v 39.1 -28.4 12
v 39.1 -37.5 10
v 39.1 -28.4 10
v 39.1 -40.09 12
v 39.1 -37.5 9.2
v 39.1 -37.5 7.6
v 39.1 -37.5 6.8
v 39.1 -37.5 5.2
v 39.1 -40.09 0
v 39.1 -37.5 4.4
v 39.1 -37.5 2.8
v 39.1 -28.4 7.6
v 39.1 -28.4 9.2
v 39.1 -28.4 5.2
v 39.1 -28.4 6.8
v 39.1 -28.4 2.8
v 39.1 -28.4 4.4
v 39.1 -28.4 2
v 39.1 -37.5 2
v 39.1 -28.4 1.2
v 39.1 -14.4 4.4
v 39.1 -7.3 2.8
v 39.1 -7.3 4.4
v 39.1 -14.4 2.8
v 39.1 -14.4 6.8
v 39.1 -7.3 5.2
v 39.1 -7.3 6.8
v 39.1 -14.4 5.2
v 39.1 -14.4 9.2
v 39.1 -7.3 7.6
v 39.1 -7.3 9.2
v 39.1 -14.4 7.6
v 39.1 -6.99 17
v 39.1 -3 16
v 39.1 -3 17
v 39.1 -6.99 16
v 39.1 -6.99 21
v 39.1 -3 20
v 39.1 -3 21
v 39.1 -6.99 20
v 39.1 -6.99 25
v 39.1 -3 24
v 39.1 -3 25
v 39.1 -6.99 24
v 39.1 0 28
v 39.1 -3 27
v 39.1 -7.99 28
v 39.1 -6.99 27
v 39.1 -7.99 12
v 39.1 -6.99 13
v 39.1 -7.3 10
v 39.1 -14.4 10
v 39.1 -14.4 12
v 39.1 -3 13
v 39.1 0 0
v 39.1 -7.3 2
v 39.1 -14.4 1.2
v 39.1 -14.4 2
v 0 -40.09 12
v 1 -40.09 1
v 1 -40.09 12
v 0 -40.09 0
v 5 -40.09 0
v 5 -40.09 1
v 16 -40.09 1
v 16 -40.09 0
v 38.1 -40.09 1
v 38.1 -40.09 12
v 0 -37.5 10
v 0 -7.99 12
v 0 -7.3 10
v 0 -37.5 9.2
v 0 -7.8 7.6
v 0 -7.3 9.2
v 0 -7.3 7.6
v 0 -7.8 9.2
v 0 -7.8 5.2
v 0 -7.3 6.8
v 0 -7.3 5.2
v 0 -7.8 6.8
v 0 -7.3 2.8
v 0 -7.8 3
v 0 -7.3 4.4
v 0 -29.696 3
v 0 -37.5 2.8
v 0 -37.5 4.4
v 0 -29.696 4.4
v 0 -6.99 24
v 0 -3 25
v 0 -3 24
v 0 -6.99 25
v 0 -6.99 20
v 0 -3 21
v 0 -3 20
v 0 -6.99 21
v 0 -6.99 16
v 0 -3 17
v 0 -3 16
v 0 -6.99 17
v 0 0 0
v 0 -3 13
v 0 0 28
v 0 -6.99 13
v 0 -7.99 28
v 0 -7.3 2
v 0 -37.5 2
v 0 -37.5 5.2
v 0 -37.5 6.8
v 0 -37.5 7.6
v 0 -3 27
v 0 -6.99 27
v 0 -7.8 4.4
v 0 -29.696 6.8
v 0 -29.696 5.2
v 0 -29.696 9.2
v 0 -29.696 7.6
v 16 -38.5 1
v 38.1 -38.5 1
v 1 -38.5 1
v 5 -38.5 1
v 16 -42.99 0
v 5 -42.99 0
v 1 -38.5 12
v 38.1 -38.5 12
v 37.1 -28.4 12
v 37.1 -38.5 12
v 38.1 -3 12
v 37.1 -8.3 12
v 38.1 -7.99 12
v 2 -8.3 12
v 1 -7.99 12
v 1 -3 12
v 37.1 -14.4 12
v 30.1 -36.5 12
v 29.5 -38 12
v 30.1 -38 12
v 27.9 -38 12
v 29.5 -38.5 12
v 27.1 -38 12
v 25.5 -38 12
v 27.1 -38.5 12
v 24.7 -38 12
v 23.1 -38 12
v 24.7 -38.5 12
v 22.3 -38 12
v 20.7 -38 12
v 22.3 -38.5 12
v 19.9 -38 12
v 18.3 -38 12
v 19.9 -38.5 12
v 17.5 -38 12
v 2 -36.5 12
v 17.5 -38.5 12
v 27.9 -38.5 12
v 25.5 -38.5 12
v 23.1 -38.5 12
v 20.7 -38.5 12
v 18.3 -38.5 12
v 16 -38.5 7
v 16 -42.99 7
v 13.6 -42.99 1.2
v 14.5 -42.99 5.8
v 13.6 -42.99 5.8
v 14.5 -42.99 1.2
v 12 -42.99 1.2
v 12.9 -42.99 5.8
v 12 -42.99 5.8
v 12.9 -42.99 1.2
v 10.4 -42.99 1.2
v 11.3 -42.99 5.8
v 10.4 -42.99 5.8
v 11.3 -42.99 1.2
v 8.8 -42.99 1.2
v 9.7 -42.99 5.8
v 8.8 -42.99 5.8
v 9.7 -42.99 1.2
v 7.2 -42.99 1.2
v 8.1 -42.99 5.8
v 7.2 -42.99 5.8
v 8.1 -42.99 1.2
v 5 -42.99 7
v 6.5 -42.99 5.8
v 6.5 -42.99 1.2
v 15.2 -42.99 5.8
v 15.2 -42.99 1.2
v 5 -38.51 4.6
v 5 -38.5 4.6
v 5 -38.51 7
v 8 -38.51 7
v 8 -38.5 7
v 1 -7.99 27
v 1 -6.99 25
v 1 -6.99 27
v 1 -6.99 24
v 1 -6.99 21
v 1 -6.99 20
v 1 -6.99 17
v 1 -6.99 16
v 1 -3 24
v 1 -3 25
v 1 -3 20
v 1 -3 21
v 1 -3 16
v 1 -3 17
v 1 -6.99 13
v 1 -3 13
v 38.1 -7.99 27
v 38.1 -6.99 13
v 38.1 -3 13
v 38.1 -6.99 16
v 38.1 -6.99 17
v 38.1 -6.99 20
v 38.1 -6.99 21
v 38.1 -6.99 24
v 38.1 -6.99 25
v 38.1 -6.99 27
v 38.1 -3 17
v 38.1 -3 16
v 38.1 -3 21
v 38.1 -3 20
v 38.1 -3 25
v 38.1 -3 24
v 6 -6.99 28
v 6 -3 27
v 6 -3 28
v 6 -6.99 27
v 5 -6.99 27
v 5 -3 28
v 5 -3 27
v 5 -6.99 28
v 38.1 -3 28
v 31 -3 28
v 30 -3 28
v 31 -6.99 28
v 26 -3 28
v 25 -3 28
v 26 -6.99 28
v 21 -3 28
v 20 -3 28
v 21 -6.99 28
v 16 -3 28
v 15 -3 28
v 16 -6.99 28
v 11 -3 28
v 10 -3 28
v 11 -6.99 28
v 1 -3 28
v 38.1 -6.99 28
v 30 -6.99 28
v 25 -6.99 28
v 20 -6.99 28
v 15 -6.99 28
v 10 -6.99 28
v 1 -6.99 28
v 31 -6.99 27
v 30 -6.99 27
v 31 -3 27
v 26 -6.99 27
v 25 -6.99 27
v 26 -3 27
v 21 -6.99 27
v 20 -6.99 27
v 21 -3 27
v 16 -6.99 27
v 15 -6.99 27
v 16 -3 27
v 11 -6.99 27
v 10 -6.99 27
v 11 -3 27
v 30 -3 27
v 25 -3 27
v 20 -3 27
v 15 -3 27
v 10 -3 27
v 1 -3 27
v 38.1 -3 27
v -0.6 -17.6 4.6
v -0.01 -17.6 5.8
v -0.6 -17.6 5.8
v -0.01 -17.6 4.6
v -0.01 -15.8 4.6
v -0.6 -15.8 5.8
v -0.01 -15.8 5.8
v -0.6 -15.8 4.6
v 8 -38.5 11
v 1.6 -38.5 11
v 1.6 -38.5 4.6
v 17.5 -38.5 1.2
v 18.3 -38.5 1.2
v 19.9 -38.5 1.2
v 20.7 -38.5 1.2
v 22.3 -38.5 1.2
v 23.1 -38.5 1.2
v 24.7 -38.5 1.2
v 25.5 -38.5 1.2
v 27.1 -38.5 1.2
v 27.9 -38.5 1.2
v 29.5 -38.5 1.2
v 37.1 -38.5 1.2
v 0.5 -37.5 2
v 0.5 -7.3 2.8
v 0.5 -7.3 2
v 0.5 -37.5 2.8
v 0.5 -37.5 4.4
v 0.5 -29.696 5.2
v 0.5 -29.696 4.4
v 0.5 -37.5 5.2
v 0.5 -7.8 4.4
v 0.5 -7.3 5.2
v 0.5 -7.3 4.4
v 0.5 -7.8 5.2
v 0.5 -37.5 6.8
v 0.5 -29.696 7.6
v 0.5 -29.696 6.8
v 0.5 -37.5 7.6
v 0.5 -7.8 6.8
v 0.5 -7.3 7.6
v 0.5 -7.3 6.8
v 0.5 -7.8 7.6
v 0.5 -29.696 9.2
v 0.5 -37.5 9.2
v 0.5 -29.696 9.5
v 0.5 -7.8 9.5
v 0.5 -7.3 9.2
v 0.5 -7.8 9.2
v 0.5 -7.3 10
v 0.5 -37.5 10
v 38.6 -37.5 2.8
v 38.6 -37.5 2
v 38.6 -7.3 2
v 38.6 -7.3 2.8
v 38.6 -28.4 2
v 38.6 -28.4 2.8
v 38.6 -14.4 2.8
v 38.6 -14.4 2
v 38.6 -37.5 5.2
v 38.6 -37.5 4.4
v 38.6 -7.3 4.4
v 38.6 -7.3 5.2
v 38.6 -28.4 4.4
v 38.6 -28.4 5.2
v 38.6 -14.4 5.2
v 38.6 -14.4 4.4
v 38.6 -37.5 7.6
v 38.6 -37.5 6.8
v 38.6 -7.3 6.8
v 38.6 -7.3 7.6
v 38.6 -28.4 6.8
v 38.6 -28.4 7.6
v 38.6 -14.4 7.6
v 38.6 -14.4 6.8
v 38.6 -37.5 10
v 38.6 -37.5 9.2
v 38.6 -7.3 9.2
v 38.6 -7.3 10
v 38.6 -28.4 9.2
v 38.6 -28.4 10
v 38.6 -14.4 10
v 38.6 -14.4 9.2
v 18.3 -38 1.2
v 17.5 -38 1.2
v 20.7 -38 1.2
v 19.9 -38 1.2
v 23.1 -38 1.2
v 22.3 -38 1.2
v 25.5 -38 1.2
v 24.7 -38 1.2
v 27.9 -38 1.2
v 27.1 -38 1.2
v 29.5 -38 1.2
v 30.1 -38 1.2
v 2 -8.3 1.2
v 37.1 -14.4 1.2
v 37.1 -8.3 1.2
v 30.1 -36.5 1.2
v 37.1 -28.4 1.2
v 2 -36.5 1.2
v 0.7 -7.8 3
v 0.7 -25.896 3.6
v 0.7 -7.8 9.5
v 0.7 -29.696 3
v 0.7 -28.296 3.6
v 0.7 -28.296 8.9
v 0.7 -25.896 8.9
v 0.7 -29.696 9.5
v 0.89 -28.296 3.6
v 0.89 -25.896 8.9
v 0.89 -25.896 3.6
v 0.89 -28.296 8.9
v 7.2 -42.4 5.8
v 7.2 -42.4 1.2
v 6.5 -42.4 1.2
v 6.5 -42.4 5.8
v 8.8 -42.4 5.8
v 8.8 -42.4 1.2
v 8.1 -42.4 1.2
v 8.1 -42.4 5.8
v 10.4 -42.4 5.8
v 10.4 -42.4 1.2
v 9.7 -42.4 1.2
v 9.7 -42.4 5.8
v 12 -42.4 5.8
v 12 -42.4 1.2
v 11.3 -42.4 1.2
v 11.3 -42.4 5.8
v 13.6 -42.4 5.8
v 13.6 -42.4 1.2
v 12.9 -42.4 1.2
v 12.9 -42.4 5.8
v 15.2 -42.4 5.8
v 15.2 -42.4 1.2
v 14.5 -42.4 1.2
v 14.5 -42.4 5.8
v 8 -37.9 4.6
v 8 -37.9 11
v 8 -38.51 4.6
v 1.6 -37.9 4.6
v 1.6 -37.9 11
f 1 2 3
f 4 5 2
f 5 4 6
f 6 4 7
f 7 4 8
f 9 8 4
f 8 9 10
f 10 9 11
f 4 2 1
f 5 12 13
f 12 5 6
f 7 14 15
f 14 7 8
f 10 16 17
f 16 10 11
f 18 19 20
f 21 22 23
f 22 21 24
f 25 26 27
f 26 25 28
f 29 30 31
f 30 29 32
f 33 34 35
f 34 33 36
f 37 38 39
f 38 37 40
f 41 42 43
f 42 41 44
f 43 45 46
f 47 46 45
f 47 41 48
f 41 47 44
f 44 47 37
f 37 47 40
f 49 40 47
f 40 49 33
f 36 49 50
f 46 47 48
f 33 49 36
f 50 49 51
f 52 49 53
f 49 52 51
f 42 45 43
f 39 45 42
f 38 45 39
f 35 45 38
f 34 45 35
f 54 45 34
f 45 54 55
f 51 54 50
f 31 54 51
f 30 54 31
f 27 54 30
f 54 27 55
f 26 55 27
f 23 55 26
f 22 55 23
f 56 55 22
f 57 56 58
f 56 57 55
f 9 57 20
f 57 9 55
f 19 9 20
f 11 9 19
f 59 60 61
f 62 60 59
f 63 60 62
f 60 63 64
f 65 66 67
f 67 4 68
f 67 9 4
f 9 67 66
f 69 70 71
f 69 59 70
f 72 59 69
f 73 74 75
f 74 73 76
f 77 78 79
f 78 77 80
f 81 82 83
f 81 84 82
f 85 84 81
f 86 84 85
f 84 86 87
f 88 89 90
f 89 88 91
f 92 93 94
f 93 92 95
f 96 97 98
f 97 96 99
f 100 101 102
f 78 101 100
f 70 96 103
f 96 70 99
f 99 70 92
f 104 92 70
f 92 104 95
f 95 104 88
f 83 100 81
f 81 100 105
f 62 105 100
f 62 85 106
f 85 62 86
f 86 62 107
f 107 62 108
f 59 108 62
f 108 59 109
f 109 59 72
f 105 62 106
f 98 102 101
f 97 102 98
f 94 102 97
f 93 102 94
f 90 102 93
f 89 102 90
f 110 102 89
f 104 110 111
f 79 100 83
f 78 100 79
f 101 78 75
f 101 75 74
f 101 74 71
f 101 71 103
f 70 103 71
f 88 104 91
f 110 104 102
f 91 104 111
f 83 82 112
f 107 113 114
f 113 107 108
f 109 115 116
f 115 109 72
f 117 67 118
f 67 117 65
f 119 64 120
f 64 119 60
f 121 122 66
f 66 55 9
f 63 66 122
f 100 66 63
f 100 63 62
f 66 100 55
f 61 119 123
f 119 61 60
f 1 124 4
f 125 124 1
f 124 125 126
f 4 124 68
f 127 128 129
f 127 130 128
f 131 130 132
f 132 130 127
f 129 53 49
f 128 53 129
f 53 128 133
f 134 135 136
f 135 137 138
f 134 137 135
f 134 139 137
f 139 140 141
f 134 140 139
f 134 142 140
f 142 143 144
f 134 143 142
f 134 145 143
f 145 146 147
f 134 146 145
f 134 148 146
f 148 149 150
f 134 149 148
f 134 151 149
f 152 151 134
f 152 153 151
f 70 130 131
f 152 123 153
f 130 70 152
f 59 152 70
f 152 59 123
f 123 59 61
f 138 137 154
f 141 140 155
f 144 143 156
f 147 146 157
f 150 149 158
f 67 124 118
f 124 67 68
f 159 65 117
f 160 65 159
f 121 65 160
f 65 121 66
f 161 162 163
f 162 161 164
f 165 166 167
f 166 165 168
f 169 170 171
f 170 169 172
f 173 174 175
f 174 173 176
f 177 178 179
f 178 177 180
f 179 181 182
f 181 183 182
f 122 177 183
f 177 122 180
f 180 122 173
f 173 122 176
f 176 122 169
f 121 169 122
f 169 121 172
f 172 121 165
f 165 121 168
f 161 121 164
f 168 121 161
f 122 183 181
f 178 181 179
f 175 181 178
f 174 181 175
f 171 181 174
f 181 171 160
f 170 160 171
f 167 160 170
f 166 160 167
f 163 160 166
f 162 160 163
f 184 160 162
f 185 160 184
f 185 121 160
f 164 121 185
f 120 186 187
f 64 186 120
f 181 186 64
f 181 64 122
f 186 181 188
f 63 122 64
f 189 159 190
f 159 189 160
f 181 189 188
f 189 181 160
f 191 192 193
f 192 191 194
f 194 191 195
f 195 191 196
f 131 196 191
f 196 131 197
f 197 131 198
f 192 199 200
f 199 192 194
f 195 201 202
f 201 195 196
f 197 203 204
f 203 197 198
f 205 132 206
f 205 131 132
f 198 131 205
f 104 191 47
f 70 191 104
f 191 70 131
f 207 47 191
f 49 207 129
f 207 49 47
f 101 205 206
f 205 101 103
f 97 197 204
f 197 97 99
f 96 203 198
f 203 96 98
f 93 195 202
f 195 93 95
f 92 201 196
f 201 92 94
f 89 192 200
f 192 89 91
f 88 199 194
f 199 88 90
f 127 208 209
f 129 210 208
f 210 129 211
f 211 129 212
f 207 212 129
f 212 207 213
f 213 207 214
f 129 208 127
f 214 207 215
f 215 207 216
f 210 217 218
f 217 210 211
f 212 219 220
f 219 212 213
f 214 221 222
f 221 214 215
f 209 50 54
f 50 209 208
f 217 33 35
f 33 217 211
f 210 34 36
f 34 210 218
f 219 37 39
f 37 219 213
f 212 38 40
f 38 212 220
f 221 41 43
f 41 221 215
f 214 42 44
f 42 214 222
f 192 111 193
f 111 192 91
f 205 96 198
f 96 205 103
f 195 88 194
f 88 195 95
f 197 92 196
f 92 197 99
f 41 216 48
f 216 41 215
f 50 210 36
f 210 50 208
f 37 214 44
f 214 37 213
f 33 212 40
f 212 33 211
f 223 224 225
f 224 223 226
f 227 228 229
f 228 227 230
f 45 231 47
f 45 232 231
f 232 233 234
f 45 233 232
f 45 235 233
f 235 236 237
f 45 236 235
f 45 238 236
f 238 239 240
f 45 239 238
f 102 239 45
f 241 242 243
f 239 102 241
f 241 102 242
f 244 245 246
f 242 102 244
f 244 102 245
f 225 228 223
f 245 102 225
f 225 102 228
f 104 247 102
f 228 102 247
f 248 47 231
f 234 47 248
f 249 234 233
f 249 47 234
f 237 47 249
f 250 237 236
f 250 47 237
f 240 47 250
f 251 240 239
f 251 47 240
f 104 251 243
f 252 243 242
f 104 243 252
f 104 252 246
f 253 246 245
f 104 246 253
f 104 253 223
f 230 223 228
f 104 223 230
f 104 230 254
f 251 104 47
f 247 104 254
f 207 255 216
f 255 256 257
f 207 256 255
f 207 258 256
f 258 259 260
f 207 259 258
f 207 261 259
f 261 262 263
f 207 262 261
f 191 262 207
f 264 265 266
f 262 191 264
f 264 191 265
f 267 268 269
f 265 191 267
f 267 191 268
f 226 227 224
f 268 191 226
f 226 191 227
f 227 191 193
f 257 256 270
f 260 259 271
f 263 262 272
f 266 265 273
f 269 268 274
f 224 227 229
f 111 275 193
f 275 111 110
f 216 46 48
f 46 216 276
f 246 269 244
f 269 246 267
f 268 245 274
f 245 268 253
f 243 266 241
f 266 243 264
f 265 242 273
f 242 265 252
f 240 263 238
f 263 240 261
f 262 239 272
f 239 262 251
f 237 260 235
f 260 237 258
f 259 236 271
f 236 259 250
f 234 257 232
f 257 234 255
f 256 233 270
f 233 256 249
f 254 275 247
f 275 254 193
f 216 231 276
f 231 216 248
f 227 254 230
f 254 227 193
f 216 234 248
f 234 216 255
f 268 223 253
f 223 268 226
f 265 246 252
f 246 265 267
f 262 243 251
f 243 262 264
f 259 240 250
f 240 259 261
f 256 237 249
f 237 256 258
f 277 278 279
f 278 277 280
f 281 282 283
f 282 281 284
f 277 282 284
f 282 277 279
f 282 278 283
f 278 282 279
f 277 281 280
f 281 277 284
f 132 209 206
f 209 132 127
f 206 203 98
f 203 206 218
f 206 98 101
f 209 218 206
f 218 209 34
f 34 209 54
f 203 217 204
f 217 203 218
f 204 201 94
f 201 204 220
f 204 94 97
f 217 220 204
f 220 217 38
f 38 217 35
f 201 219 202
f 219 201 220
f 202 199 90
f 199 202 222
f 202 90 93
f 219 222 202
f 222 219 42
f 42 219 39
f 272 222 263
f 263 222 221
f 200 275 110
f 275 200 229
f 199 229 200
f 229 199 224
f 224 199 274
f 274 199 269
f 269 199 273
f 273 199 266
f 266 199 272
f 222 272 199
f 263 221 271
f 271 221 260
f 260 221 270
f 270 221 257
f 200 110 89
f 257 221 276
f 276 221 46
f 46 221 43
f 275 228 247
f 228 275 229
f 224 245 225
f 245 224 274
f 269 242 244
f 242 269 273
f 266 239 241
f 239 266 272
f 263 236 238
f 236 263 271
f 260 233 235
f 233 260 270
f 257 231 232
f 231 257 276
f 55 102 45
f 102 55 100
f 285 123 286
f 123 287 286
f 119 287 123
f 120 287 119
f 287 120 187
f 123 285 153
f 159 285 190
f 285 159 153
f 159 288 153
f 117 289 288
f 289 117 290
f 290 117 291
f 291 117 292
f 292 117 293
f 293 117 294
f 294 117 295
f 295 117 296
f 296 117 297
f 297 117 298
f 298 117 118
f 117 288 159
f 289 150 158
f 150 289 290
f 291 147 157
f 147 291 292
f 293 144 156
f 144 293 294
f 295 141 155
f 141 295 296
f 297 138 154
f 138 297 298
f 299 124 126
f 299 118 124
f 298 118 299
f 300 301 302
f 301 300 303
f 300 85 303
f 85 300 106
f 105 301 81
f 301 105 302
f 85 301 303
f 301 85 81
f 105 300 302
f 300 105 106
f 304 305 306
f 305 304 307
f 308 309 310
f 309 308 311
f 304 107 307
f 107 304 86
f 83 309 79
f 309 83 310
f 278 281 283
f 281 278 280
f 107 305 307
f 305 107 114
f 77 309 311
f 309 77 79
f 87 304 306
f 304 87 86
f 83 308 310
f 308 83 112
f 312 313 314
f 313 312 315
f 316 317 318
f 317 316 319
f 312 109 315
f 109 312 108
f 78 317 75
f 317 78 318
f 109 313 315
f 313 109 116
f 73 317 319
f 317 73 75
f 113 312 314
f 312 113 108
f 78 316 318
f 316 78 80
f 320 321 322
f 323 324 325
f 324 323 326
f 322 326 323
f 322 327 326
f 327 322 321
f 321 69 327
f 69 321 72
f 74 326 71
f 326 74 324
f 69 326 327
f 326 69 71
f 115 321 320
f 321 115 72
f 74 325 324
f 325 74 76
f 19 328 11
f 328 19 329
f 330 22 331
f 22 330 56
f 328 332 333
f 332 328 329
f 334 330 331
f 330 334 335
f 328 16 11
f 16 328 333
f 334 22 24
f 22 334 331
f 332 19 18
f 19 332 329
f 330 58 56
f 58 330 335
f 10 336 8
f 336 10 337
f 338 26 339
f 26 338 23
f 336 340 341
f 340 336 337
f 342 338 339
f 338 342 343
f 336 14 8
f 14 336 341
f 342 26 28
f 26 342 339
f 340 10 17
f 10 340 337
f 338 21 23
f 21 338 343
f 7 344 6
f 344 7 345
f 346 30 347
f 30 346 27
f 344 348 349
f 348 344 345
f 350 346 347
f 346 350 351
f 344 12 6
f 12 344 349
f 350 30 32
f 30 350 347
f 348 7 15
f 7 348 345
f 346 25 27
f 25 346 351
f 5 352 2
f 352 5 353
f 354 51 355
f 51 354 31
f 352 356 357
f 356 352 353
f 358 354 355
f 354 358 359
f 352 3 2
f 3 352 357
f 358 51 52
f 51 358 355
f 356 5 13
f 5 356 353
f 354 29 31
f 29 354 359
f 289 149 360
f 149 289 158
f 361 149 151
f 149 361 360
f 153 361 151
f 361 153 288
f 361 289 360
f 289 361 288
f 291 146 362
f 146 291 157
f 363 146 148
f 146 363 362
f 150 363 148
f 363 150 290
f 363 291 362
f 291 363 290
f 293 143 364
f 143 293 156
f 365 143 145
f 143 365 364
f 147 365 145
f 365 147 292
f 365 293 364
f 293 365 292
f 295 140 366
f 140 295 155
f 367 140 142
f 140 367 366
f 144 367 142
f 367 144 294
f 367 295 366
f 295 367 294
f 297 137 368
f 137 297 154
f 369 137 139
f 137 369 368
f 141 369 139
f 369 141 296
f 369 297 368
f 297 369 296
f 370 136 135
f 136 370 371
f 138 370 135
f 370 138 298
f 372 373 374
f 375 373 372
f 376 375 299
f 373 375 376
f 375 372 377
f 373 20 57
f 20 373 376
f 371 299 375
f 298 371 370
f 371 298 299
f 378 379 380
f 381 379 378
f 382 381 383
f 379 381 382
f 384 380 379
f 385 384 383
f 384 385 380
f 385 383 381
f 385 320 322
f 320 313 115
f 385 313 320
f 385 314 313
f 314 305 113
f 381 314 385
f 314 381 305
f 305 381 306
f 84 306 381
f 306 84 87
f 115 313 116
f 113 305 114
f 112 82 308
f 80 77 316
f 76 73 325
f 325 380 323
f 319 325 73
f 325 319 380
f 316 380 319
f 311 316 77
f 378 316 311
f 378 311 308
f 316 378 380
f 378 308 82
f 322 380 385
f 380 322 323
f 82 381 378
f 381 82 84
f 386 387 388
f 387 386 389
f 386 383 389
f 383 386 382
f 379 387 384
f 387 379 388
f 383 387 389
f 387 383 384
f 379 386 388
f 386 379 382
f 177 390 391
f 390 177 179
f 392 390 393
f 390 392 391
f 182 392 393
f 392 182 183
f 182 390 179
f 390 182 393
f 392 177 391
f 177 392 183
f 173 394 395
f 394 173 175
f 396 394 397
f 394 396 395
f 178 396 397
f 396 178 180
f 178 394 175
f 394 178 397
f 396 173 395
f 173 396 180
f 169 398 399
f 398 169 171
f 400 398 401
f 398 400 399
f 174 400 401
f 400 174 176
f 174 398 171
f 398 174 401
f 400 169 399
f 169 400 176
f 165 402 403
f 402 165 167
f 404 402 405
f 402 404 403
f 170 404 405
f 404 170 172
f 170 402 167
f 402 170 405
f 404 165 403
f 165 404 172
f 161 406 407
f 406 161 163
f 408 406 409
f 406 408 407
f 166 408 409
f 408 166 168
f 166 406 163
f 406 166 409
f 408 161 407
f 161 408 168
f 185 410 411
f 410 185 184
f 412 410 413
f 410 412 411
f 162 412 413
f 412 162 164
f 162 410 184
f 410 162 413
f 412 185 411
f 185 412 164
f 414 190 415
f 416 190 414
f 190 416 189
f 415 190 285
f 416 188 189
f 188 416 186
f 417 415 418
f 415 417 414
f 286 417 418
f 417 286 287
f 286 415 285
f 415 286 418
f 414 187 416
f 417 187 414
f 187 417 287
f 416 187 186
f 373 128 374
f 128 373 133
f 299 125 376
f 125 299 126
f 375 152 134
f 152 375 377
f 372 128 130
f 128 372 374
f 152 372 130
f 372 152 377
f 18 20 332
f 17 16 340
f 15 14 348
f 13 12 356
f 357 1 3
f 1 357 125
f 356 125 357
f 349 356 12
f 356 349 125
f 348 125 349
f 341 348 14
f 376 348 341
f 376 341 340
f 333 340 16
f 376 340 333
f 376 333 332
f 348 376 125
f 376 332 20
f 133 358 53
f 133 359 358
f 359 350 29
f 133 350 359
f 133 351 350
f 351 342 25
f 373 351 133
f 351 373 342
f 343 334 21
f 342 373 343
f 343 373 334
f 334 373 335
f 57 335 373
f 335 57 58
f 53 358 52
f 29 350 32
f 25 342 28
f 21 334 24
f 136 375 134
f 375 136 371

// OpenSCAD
// Presence Monitor - radar station, adhesive-base version (no clip)
// LOLIN S2 Mini + HLK-LD2410C stack in a hut on a flat base that sticks to the monitor top
// with a Command strip or 3M VHB. Dish faceplate glued on the front.
// All dimensions in mm. Edit the values, F6 to render, F7 to export.
//
// Three printed parts, no supports (only short bridges of 5 mm or less):
//   part = "station" : base + riser + hut. Print FRONT FACE DOWN (radar wall on the bed, open
//                      back facing up). Exported already in that position.
//   part = "dish"    : dish faceplate. Print flat back down. 0.12 mm layers look best.
//   part = "tower"   : lattice comms tower. Print standing up as exported; glue into the roof socket.
//   part = "preview" : both, assembled (for looking only).
//
// Coordinates (assembled): X = across the monitor, Y = front-to-back (0 = monitor front edge,
// +Y = back), Z = up (0 = top surface of the monitor). USB-C slot on the right, seen from the front.

/* ---------- Measure / set these ---------- */
base_d    = 28;    // base depth front-to-back; keep it under the monitor's ~30 mm top depth
stack_t   = 10;    // board stack thickness incl. USB-C connector and solder points (measured 10 mm)

/* ---------- Radar window (where the radar antennas sit, seen from the front) ---------- */
win_dx    = 3.3;   // window center offset from hut-face center, + = toward USB side (estimate)
win_dz    = 6.6;   // window center offset from hut-face center, + = up (estimate)
win_d     = 30;    // window hole diameter in the dish
win_cover = false; // true = 0.8 mm skin over the window (untested for radar range)

/* ---------- Detail (all print without supports, front face down) ---------- */
siding    = true;  // corrugated siding grooves on the side walls and roof
door      = true;  // recessed door with handle on the left wall
roof_kit  = true;  // roof parapet and a rooftop HVAC unit at the front edge
mast      = false; // flat mast molded on the front-left corner (off: use the glue-on tower instead)
tower     = true;  // socket on the roof for the separate glue-on lattice tower (part = "tower")
tower_h   = 24.6;   // lattice tower height
fence     = true;  // perimeter fence on the base behind the hut

/* ---------- Dish ---------- */
dish_d    = 56;  dish_bowl = 4.5;  dish_fn = 120;

/* ---------- Usually leave these ---------- */
pcb_len = 34.3;  pcb_h = 25.4;  radar_over = 2.0;  clr = 0.4;
base_t = 3;  wall = 2.0;  front_w = 1.2;
usb_slot_h = 14;  btn_len = 7;

/* ---------- Derived ---------- */
in_x = pcb_len + 2*clr;   in_y = stack_t + 2*clr;   in_z = pcb_h + radar_over + 2*clr;
box_x = in_x + 2*wall;    box_y = front_w + in_y;   box_z = wall + in_z + wall;
R = dish_d / 2;
ped_h = max(0, R - box_z/2 - win_dz - base_t + 1);   // riser so the dish clears the screen by 1 mm
zb = base_t + ped_h;                                  // hut floor
face_c = [box_x/2, 0, zb + box_z/2];                  // hut front-face center

function zf(r) = 1.8 + dish_bowl * pow(r / R, 2);

zt = zb + box_z;                                      // roof surface

module diamond_holes_yz(x0, w, y0, y1, z0, z1, d) {   // diamond holes through a plate in the YZ plane
    a = d / sqrt(2);
    for (z = [z0 + d/2 + 1 : d + 1 : z1 - d/2 - 1])
        translate([x0 - 1, (y0 + y1)/2, z]) rotate([45, 0, 0]) cube([w + 2, a, a], center = true);
}

module details_add() {
    if (roof_kit) {
        // parapet: front and side rims (start at the front face, so they grow from the bed)
        translate([0, 0, zt - 0.01]) cube([box_x, 1.0, 1.6]);
        translate([0, 0, zt - 0.01]) cube([1.0, box_y, 1.6]);
        translate([box_x - 1.0, 0, zt - 0.01]) cube([1.0, box_y, 1.6]);
        // rooftop HVAC unit, flush with the front edge
        translate([5, 0, zt - 0.01]) cube([11, 7, 4.5]);
    }
    if (mast) {
        // flat lattice mast at the front-left corner (a short wall when printing)
        difference() {
            translate([0, 0, zt - 0.01]) cube([1.6, 4, 17]);
            diamond_holes_yz(0, 1.6, 0, 4, zt + 1, zt + 15, 2.2);
        }
        translate([-0.6, 0, zt + 17 - 0.01]) cube([2.8, 3, 2.2]);    // beacon housing
    }
    if (door) translate([-0.6, 4.6, zb + 9.5]) cube([0.61, 1.2, 1.8]); // door handle (0.6 mm, tiny ledge)
    if (fence && base_d > box_y + 3) {
        fy0 = box_y;  fy1 = base_d;  fz0 = base_t - 0.01;  fh = 5;
        for (x = [0, box_x - 1]) {                                 // side rails, continuing back from the hut walls
            translate([x, fy0 - 0.01, fz0 + fh - 1]) cube([1, fy1 - fy0, 1]);
            for (y = [fy0 : 4 : fy1 - 1]) translate([x, y, fz0]) cube([1, 1, fh]);
        }
        translate([0, fy1 - 1, fz0]) cube([1, 1, fh]);
        translate([box_x - 1, fy1 - 1, fz0]) cube([1, 1, fh]);
        translate([0, fy1 - 1, fz0 + fh - 1]) cube([box_x, 1, 1]);     // back rail (short bridges between posts)
        for (x = [5 : 5 : box_x - 5]) translate([x, fy1 - 1, fz0]) cube([1, 1, fh]);
    }
}

module details_cut() {
    if (siding) {
        // vertical corrugation grooves on both side walls
        for (x = [-0.01, box_x - 0.5]) for (y = [2 : 2.4 : box_y - 1])
            translate([x, y, zb + 1]) cube([0.51, 0.8, box_z - 2]);
        // roof corrugation, front-to-back grooves (clear of the rooftop unit and parapet)
        for (x = [17.5 : 2.4 : box_x - 2.5]) translate([x, 1.2, zt - 0.5]) cube([0.8, box_y, 0.51]);
    }
    if (door) {
        translate([-0.01, 3, zb + 1.5]) cube([0.71, 6.5, box_z * 0.68]);          // door recess
        translate([-0.01, 3.6, zb + 2.2 + box_z * 0.68 - 4.5]) cube([0.9, 5.3, 2.4]); // door window
    }
    if (tower) translate([1.6, box_y - 7.4, zt - 0.6]) cube([6.4, 6.4, 0.61]);   // tower socket (back-left)
    if (roof_kit) {
        // grille slots in the top of the HVAC unit and a louvre panel on its front
        for (x = [6.5 : 1.6 : 15]) translate([x, 1.2, zt + 3.9]) cube([0.7, 4.6, 0.7]);
    }
}

module station() {
    difference() {
        union() {
            cube([box_x, base_d, base_t]);                                   // base (adhesive goes under it)
            translate([0, 0, base_t - 0.01]) cube([box_x, box_y, ped_h + 0.02]);   // solid riser
            translate([0, 0, zb]) cube([box_x, box_y, box_z]);               // hut
            details_add();
        }
        details_cut();
        // board cavity, open at the back (top of the print)
        translate([wall, front_w, zb + wall]) cube([in_x, in_y + 1, in_z]);
        // USB-C slot, right side, open to the back
        translate([box_x - wall - 1, front_w, zb + wall + clr + pcb_h/2 - usb_slot_h/2])
            cube([wall + 2, in_y + 1, usb_slot_h]);
        // button slot in the top wall at the USB end, open to the back
        translate([box_x - wall - btn_len, front_w, zb + wall + in_z - 1])
            cube([btn_len, in_y + 1, wall + 4]);
    }
}


// simple square tower, printed upright: 1.6 mm corner posts and 1.2 mm rings every 5 mm
// (no diagonals, rings bridge 2.8 mm), platform and beacon on top with a 2 mm hole for a
// short piece of 1.75 mm filament as the whip antenna. 6 mm foot fits the roof socket.
module lattice_tower() {
    w = 6;  p = 1.6;  seg = 5;  h = tower_h;
    translate([0, 0, 0]) difference() {
        union() {
            cube([w, w, 0.8]);                                                     // foot
            for (x = [0, w - p], y = [0, w - p]) translate([x, y, 0]) cube([p, p, h]);   // corner posts
            for (z = [seg : seg : h - 1]) difference() {                           // rings
                translate([0, 0, z]) cube([w, w, 1.2]);
                translate([p, p, z - 1]) cube([w - 2*p, w - 2*p, 3.2]);
            }
            translate([-0.2, -0.2, h - 0.01]) cube([w + 0.4, w + 0.4, 1.2]);      // platform
            translate([w/2, w/2, h + 1.19]) cylinder(d1 = 4, d2 = 3, h = 3, $fn = 24);   // beacon
        }
        translate([w/2, w/2, h - 1.5]) cylinder(d = 2.0, h = 10, $fn = 16);       // whip hole, 5.7 mm deep
    }
}

module dish() {
    rw = win_d / 2;  N = 40;  edge = 0.8;
    Rb = R - (zf(R) - edge);                       // 45-degree skirt on the back
    union() {
        rotate_extrude($fn = dish_fn)
            polygon(concat([[rw, 0], [Rb, 0], [R, zf(R) - edge]],
                           [for (i = [0 : N]) let(r = R - (R - rw) * i / N) [r, zf(r)]]));
        rotate_extrude($fn = dish_fn)
            polygon([[R - 1.6, zf(R) - edge], [R, zf(R) - edge], [R, zf(R) + 1.2], [R - 1.6, zf(R - 1.6) + 1.2]]);
        rotate_extrude($fn = dish_fn)
            polygon([[rw, 0], [rw + 1.6, 0], [rw + 1.6, zf(rw) + 2.5], [rw, zf(rw) + 2.5]]);
        for (a = [45 : 90 : 359]) rotate([0, 0, a]) rotate([90, 0, 0])
            linear_extrude(1.2, center = true)
                polygon(concat([for (i = [0 : 12]) let(r = rw + 1.5 + (R - 1.6 - rw - 1.5) * i / 12) [r, zf(r) - 0.5]],
                               [for (i = [12 : -1 : 0]) let(r = rw + 1.5 + (R - 1.6 - rw - 1.5) * i / 12) [r, zf(r) + 0.8]]));
        for (a = [0 : 30 : 359]) rotate([0, 0, a]) translate([R - 0.8, 0, zf(R) + 1.2 - 0.5])
            cylinder(d = 1.2, h = 1.1, $fn = 12);
        if (win_cover) cylinder(r = rw + 0.2, h = 0.8, $fn = dish_fn);
    }
}

module dish_placed() { translate(face_c + [win_dx, 0, win_dz]) rotate([90, 0, 0]) dish(); }

part = "station";
if (part == "station") rotate([90, 0, 0]) station();          // front face down on the bed
else if (part == "station_installed") station();
else if (part == "dish") dish();
else if (part == "tower") lattice_tower();
else if (part == "tower_placed") translate([1.6 + 0.2, box_y - 7.4 + 0.2, zt - 0.6]) lattice_tower();
else if (part == "dish_placed") dish_placed();
else if (part == "preview") { station(); color("silver") dish_placed();
                               if (tower) translate([1.6 + 0.2, box_y - 7.4 + 0.2, zt - 0.6]) lattice_tower(); }
